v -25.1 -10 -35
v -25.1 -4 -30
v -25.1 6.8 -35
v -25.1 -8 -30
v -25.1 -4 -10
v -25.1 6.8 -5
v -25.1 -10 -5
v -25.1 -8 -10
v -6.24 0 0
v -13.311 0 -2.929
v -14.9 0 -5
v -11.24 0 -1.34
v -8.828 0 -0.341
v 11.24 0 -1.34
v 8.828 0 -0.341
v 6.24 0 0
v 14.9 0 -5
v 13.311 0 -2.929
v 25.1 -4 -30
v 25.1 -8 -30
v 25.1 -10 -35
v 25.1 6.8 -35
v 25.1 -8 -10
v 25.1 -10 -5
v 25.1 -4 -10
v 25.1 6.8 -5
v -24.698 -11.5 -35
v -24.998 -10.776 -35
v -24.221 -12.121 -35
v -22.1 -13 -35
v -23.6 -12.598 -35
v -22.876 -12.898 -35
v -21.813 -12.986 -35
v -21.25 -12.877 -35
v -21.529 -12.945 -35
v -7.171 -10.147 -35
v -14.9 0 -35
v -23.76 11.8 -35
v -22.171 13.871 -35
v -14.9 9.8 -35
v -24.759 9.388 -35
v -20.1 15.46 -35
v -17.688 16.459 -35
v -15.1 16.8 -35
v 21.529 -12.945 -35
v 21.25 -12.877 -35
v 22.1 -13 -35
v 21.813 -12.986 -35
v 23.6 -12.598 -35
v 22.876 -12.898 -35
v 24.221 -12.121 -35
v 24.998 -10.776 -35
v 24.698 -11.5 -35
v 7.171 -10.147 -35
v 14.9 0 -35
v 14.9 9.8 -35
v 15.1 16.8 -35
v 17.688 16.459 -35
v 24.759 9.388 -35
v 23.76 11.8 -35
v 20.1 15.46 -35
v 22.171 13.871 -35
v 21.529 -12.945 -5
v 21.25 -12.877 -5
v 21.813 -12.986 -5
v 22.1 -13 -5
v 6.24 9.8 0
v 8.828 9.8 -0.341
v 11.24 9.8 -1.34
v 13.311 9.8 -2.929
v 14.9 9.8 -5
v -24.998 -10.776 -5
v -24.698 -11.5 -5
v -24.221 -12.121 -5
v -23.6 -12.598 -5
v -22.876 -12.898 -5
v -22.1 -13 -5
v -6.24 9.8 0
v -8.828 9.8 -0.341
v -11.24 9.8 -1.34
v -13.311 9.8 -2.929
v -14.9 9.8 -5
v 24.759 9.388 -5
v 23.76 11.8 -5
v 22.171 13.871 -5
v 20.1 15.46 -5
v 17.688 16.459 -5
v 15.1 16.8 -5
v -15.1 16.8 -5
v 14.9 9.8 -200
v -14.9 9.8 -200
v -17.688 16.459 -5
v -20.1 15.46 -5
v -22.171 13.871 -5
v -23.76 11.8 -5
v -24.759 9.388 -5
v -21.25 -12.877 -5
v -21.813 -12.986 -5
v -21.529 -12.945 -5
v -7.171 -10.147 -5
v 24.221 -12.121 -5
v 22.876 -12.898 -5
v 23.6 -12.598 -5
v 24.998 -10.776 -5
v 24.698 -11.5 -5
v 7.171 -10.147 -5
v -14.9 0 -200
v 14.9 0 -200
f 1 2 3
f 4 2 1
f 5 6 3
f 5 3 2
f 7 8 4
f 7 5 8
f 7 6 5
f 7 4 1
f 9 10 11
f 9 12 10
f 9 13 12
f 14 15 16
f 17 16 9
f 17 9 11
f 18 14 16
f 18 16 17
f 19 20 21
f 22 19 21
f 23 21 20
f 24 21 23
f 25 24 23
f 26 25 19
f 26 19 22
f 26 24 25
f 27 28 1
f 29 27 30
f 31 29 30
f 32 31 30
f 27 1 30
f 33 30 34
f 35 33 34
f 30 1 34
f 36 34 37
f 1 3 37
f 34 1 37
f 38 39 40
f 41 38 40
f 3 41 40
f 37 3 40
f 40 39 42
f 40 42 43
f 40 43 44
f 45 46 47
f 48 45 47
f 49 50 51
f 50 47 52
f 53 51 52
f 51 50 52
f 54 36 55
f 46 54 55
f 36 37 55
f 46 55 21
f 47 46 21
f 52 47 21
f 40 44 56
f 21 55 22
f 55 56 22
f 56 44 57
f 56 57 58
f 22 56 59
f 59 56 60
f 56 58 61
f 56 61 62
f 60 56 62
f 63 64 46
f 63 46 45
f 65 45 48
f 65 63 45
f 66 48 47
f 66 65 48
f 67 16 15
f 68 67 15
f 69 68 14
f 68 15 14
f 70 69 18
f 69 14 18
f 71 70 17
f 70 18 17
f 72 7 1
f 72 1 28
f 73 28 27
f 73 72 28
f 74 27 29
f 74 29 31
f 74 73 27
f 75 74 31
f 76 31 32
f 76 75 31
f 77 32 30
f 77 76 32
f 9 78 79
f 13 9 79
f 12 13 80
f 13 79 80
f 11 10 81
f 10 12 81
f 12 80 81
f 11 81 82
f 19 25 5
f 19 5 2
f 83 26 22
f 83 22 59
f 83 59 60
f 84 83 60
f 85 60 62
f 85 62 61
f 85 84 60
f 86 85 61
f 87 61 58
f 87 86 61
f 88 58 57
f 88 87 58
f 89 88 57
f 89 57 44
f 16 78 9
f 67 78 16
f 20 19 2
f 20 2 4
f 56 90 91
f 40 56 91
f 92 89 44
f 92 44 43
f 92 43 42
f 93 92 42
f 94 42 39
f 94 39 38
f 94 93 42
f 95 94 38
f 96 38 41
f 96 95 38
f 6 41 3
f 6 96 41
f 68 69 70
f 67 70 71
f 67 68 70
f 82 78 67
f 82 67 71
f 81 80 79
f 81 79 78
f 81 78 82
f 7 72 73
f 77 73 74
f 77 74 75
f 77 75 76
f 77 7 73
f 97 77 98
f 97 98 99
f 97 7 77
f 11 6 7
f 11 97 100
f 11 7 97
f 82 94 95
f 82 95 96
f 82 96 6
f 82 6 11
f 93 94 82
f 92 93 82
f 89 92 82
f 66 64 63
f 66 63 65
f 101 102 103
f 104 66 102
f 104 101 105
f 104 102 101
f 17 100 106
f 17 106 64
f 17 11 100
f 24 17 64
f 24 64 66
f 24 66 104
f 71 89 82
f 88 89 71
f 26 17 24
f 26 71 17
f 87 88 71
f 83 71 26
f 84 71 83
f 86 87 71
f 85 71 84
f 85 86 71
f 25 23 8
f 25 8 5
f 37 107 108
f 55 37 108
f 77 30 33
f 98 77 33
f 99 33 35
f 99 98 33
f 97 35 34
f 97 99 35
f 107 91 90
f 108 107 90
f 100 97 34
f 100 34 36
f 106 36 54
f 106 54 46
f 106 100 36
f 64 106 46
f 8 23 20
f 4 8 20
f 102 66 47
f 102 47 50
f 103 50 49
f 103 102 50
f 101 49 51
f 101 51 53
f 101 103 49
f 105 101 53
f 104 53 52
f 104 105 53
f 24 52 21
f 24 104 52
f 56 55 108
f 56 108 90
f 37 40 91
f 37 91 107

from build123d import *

# Parameters (mm, degrees)
BOSS_EXTRUDE1_DEPTH = 200
SKETCH2_W           = 29.8
SKETCH2_H           = 9.8
BOSS_EXTRUDE2_DEPTH = 30
FILLET1_R           = 10
FILLET2_R           = 10
CUT_EXTRUDE1_DEPTH  = 56


with BuildPart() as part:
    # Sketch1 → Boss-Extrude1 (new body)
    with BuildSketch(Plane.XY):
        Polygon((0, 0), (14.9, 0), (14.9, 9.8), (-14.9, 9.8), (-14.9, 0), align=None)
    extrude(amount=-BOSS_EXTRUDE1_DEPTH)

    # Sketch2 → Boss-Extrude2 (add)
    with BuildSketch(Plane.XY.offset(-5)):
        with BuildLine():
            ThreePointArc((-25.1, -10), (-24.221320344, -12.121320344), (-22.1, -13))
            ThreePointArc((-22.1, -13), (-21.670577963, -12.969107057), (-21.25, -12.877064476))
            ThreePointArc((-21.25, -12.877064476), (0, -9.80367638), (21.25, -12.877064476))
            ThreePointArc((21.25, -12.877064476), (21.670577963, -12.969107057), (22.1, -13))
            ThreePointArc((22.1, -13), (24.221320344, -12.121320344), (25.1, -10))
            Line((25.1, -10), (25.1, 6.8))
            ThreePointArc((25.1, 6.8), (22.171067812, 13.871067812), (15.1, 16.8))
            Line((15.1, 16.8), (-14.9, 16.8))
            Line((-14.9, 16.8), (-15.1, 16.8))
            ThreePointArc((-15.1, 16.8), (-22.171067812, 13.871067812), (-25.1, 6.8))
            Line((-25.1, 6.8), (-25.1, -10))
        make_face()
        with Locations((0, 4.9)):
            Rectangle(SKETCH2_W, SKETCH2_H, mode=Mode.SUBTRACT)
    extrude(amount=-BOSS_EXTRUDE2_DEPTH)

    # Fillet1
    # the kernel refuses this fillet: 10 mm, written as the material it takes off along each edge
    with BuildSketch(Plane(origin=(14.9, -21.650635095, 0), x_dir=(0, 0, -1), z_dir=(0, 1, 0))) as fillet1_piece_1:
        with BuildLine():
            CenterArc((10, 8.660254038), FILLET1_R, 180, 60)
            Line((0, 8.660254038), (-0.2, 8.660254038))
            Line((-0.2, 8.660254038), (-0.2, 0))
            Line((-0.2, 0), (0, -0.2))
            ThreePointArc((0, -0.2), (2.5, -0.2), (4.9, -0.173205081))
            Line((4.9, -0.173205081), (5, 0))
        make_face()
    extrude(amount=53.101270189, mode=Mode.SUBTRACT)

    # Fillet2
    # the kernel refuses this fillet: 10 mm, written as the material it takes off along each edge
    with BuildSketch(Plane(origin=(-14.9, 31.450635095, 0), x_dir=(1, 0, 0), z_dir=(0, -1, 0))) as fillet2_piece_1:
        with BuildLine():
            CenterArc((8.660254038, -10), FILLET2_R, 90, 60)
            Line((0, -5), (-0.173205081, -4.9))
            ThreePointArc((-0.173205081, -4.9), (-0.2, -2.5), (-0.2, 0))
            Line((-0.2, 0), (0, 0.2))
            Line((0, 0.2), (8.660254038, 0.2))
            Line((8.660254038, 0.2), (8.660254038, 0))
        make_face()
    extrude(amount=53.101270189, mode=Mode.SUBTRACT)

    # Sketch3 → Cut-Extrude1 (cut)
    with BuildSketch(Plane(origin=(25.1, 0, 0), x_dir=(0, 0, -1), z_dir=(1, 0, 0))):
        Polygon((30, -4), (30, -8), (20, -8), (10, -8), (10, -4), align=None)
    extrude(amount=-CUT_EXTRUDE1_DEPTH, mode=Mode.SUBTRACT)


solid = part.part
